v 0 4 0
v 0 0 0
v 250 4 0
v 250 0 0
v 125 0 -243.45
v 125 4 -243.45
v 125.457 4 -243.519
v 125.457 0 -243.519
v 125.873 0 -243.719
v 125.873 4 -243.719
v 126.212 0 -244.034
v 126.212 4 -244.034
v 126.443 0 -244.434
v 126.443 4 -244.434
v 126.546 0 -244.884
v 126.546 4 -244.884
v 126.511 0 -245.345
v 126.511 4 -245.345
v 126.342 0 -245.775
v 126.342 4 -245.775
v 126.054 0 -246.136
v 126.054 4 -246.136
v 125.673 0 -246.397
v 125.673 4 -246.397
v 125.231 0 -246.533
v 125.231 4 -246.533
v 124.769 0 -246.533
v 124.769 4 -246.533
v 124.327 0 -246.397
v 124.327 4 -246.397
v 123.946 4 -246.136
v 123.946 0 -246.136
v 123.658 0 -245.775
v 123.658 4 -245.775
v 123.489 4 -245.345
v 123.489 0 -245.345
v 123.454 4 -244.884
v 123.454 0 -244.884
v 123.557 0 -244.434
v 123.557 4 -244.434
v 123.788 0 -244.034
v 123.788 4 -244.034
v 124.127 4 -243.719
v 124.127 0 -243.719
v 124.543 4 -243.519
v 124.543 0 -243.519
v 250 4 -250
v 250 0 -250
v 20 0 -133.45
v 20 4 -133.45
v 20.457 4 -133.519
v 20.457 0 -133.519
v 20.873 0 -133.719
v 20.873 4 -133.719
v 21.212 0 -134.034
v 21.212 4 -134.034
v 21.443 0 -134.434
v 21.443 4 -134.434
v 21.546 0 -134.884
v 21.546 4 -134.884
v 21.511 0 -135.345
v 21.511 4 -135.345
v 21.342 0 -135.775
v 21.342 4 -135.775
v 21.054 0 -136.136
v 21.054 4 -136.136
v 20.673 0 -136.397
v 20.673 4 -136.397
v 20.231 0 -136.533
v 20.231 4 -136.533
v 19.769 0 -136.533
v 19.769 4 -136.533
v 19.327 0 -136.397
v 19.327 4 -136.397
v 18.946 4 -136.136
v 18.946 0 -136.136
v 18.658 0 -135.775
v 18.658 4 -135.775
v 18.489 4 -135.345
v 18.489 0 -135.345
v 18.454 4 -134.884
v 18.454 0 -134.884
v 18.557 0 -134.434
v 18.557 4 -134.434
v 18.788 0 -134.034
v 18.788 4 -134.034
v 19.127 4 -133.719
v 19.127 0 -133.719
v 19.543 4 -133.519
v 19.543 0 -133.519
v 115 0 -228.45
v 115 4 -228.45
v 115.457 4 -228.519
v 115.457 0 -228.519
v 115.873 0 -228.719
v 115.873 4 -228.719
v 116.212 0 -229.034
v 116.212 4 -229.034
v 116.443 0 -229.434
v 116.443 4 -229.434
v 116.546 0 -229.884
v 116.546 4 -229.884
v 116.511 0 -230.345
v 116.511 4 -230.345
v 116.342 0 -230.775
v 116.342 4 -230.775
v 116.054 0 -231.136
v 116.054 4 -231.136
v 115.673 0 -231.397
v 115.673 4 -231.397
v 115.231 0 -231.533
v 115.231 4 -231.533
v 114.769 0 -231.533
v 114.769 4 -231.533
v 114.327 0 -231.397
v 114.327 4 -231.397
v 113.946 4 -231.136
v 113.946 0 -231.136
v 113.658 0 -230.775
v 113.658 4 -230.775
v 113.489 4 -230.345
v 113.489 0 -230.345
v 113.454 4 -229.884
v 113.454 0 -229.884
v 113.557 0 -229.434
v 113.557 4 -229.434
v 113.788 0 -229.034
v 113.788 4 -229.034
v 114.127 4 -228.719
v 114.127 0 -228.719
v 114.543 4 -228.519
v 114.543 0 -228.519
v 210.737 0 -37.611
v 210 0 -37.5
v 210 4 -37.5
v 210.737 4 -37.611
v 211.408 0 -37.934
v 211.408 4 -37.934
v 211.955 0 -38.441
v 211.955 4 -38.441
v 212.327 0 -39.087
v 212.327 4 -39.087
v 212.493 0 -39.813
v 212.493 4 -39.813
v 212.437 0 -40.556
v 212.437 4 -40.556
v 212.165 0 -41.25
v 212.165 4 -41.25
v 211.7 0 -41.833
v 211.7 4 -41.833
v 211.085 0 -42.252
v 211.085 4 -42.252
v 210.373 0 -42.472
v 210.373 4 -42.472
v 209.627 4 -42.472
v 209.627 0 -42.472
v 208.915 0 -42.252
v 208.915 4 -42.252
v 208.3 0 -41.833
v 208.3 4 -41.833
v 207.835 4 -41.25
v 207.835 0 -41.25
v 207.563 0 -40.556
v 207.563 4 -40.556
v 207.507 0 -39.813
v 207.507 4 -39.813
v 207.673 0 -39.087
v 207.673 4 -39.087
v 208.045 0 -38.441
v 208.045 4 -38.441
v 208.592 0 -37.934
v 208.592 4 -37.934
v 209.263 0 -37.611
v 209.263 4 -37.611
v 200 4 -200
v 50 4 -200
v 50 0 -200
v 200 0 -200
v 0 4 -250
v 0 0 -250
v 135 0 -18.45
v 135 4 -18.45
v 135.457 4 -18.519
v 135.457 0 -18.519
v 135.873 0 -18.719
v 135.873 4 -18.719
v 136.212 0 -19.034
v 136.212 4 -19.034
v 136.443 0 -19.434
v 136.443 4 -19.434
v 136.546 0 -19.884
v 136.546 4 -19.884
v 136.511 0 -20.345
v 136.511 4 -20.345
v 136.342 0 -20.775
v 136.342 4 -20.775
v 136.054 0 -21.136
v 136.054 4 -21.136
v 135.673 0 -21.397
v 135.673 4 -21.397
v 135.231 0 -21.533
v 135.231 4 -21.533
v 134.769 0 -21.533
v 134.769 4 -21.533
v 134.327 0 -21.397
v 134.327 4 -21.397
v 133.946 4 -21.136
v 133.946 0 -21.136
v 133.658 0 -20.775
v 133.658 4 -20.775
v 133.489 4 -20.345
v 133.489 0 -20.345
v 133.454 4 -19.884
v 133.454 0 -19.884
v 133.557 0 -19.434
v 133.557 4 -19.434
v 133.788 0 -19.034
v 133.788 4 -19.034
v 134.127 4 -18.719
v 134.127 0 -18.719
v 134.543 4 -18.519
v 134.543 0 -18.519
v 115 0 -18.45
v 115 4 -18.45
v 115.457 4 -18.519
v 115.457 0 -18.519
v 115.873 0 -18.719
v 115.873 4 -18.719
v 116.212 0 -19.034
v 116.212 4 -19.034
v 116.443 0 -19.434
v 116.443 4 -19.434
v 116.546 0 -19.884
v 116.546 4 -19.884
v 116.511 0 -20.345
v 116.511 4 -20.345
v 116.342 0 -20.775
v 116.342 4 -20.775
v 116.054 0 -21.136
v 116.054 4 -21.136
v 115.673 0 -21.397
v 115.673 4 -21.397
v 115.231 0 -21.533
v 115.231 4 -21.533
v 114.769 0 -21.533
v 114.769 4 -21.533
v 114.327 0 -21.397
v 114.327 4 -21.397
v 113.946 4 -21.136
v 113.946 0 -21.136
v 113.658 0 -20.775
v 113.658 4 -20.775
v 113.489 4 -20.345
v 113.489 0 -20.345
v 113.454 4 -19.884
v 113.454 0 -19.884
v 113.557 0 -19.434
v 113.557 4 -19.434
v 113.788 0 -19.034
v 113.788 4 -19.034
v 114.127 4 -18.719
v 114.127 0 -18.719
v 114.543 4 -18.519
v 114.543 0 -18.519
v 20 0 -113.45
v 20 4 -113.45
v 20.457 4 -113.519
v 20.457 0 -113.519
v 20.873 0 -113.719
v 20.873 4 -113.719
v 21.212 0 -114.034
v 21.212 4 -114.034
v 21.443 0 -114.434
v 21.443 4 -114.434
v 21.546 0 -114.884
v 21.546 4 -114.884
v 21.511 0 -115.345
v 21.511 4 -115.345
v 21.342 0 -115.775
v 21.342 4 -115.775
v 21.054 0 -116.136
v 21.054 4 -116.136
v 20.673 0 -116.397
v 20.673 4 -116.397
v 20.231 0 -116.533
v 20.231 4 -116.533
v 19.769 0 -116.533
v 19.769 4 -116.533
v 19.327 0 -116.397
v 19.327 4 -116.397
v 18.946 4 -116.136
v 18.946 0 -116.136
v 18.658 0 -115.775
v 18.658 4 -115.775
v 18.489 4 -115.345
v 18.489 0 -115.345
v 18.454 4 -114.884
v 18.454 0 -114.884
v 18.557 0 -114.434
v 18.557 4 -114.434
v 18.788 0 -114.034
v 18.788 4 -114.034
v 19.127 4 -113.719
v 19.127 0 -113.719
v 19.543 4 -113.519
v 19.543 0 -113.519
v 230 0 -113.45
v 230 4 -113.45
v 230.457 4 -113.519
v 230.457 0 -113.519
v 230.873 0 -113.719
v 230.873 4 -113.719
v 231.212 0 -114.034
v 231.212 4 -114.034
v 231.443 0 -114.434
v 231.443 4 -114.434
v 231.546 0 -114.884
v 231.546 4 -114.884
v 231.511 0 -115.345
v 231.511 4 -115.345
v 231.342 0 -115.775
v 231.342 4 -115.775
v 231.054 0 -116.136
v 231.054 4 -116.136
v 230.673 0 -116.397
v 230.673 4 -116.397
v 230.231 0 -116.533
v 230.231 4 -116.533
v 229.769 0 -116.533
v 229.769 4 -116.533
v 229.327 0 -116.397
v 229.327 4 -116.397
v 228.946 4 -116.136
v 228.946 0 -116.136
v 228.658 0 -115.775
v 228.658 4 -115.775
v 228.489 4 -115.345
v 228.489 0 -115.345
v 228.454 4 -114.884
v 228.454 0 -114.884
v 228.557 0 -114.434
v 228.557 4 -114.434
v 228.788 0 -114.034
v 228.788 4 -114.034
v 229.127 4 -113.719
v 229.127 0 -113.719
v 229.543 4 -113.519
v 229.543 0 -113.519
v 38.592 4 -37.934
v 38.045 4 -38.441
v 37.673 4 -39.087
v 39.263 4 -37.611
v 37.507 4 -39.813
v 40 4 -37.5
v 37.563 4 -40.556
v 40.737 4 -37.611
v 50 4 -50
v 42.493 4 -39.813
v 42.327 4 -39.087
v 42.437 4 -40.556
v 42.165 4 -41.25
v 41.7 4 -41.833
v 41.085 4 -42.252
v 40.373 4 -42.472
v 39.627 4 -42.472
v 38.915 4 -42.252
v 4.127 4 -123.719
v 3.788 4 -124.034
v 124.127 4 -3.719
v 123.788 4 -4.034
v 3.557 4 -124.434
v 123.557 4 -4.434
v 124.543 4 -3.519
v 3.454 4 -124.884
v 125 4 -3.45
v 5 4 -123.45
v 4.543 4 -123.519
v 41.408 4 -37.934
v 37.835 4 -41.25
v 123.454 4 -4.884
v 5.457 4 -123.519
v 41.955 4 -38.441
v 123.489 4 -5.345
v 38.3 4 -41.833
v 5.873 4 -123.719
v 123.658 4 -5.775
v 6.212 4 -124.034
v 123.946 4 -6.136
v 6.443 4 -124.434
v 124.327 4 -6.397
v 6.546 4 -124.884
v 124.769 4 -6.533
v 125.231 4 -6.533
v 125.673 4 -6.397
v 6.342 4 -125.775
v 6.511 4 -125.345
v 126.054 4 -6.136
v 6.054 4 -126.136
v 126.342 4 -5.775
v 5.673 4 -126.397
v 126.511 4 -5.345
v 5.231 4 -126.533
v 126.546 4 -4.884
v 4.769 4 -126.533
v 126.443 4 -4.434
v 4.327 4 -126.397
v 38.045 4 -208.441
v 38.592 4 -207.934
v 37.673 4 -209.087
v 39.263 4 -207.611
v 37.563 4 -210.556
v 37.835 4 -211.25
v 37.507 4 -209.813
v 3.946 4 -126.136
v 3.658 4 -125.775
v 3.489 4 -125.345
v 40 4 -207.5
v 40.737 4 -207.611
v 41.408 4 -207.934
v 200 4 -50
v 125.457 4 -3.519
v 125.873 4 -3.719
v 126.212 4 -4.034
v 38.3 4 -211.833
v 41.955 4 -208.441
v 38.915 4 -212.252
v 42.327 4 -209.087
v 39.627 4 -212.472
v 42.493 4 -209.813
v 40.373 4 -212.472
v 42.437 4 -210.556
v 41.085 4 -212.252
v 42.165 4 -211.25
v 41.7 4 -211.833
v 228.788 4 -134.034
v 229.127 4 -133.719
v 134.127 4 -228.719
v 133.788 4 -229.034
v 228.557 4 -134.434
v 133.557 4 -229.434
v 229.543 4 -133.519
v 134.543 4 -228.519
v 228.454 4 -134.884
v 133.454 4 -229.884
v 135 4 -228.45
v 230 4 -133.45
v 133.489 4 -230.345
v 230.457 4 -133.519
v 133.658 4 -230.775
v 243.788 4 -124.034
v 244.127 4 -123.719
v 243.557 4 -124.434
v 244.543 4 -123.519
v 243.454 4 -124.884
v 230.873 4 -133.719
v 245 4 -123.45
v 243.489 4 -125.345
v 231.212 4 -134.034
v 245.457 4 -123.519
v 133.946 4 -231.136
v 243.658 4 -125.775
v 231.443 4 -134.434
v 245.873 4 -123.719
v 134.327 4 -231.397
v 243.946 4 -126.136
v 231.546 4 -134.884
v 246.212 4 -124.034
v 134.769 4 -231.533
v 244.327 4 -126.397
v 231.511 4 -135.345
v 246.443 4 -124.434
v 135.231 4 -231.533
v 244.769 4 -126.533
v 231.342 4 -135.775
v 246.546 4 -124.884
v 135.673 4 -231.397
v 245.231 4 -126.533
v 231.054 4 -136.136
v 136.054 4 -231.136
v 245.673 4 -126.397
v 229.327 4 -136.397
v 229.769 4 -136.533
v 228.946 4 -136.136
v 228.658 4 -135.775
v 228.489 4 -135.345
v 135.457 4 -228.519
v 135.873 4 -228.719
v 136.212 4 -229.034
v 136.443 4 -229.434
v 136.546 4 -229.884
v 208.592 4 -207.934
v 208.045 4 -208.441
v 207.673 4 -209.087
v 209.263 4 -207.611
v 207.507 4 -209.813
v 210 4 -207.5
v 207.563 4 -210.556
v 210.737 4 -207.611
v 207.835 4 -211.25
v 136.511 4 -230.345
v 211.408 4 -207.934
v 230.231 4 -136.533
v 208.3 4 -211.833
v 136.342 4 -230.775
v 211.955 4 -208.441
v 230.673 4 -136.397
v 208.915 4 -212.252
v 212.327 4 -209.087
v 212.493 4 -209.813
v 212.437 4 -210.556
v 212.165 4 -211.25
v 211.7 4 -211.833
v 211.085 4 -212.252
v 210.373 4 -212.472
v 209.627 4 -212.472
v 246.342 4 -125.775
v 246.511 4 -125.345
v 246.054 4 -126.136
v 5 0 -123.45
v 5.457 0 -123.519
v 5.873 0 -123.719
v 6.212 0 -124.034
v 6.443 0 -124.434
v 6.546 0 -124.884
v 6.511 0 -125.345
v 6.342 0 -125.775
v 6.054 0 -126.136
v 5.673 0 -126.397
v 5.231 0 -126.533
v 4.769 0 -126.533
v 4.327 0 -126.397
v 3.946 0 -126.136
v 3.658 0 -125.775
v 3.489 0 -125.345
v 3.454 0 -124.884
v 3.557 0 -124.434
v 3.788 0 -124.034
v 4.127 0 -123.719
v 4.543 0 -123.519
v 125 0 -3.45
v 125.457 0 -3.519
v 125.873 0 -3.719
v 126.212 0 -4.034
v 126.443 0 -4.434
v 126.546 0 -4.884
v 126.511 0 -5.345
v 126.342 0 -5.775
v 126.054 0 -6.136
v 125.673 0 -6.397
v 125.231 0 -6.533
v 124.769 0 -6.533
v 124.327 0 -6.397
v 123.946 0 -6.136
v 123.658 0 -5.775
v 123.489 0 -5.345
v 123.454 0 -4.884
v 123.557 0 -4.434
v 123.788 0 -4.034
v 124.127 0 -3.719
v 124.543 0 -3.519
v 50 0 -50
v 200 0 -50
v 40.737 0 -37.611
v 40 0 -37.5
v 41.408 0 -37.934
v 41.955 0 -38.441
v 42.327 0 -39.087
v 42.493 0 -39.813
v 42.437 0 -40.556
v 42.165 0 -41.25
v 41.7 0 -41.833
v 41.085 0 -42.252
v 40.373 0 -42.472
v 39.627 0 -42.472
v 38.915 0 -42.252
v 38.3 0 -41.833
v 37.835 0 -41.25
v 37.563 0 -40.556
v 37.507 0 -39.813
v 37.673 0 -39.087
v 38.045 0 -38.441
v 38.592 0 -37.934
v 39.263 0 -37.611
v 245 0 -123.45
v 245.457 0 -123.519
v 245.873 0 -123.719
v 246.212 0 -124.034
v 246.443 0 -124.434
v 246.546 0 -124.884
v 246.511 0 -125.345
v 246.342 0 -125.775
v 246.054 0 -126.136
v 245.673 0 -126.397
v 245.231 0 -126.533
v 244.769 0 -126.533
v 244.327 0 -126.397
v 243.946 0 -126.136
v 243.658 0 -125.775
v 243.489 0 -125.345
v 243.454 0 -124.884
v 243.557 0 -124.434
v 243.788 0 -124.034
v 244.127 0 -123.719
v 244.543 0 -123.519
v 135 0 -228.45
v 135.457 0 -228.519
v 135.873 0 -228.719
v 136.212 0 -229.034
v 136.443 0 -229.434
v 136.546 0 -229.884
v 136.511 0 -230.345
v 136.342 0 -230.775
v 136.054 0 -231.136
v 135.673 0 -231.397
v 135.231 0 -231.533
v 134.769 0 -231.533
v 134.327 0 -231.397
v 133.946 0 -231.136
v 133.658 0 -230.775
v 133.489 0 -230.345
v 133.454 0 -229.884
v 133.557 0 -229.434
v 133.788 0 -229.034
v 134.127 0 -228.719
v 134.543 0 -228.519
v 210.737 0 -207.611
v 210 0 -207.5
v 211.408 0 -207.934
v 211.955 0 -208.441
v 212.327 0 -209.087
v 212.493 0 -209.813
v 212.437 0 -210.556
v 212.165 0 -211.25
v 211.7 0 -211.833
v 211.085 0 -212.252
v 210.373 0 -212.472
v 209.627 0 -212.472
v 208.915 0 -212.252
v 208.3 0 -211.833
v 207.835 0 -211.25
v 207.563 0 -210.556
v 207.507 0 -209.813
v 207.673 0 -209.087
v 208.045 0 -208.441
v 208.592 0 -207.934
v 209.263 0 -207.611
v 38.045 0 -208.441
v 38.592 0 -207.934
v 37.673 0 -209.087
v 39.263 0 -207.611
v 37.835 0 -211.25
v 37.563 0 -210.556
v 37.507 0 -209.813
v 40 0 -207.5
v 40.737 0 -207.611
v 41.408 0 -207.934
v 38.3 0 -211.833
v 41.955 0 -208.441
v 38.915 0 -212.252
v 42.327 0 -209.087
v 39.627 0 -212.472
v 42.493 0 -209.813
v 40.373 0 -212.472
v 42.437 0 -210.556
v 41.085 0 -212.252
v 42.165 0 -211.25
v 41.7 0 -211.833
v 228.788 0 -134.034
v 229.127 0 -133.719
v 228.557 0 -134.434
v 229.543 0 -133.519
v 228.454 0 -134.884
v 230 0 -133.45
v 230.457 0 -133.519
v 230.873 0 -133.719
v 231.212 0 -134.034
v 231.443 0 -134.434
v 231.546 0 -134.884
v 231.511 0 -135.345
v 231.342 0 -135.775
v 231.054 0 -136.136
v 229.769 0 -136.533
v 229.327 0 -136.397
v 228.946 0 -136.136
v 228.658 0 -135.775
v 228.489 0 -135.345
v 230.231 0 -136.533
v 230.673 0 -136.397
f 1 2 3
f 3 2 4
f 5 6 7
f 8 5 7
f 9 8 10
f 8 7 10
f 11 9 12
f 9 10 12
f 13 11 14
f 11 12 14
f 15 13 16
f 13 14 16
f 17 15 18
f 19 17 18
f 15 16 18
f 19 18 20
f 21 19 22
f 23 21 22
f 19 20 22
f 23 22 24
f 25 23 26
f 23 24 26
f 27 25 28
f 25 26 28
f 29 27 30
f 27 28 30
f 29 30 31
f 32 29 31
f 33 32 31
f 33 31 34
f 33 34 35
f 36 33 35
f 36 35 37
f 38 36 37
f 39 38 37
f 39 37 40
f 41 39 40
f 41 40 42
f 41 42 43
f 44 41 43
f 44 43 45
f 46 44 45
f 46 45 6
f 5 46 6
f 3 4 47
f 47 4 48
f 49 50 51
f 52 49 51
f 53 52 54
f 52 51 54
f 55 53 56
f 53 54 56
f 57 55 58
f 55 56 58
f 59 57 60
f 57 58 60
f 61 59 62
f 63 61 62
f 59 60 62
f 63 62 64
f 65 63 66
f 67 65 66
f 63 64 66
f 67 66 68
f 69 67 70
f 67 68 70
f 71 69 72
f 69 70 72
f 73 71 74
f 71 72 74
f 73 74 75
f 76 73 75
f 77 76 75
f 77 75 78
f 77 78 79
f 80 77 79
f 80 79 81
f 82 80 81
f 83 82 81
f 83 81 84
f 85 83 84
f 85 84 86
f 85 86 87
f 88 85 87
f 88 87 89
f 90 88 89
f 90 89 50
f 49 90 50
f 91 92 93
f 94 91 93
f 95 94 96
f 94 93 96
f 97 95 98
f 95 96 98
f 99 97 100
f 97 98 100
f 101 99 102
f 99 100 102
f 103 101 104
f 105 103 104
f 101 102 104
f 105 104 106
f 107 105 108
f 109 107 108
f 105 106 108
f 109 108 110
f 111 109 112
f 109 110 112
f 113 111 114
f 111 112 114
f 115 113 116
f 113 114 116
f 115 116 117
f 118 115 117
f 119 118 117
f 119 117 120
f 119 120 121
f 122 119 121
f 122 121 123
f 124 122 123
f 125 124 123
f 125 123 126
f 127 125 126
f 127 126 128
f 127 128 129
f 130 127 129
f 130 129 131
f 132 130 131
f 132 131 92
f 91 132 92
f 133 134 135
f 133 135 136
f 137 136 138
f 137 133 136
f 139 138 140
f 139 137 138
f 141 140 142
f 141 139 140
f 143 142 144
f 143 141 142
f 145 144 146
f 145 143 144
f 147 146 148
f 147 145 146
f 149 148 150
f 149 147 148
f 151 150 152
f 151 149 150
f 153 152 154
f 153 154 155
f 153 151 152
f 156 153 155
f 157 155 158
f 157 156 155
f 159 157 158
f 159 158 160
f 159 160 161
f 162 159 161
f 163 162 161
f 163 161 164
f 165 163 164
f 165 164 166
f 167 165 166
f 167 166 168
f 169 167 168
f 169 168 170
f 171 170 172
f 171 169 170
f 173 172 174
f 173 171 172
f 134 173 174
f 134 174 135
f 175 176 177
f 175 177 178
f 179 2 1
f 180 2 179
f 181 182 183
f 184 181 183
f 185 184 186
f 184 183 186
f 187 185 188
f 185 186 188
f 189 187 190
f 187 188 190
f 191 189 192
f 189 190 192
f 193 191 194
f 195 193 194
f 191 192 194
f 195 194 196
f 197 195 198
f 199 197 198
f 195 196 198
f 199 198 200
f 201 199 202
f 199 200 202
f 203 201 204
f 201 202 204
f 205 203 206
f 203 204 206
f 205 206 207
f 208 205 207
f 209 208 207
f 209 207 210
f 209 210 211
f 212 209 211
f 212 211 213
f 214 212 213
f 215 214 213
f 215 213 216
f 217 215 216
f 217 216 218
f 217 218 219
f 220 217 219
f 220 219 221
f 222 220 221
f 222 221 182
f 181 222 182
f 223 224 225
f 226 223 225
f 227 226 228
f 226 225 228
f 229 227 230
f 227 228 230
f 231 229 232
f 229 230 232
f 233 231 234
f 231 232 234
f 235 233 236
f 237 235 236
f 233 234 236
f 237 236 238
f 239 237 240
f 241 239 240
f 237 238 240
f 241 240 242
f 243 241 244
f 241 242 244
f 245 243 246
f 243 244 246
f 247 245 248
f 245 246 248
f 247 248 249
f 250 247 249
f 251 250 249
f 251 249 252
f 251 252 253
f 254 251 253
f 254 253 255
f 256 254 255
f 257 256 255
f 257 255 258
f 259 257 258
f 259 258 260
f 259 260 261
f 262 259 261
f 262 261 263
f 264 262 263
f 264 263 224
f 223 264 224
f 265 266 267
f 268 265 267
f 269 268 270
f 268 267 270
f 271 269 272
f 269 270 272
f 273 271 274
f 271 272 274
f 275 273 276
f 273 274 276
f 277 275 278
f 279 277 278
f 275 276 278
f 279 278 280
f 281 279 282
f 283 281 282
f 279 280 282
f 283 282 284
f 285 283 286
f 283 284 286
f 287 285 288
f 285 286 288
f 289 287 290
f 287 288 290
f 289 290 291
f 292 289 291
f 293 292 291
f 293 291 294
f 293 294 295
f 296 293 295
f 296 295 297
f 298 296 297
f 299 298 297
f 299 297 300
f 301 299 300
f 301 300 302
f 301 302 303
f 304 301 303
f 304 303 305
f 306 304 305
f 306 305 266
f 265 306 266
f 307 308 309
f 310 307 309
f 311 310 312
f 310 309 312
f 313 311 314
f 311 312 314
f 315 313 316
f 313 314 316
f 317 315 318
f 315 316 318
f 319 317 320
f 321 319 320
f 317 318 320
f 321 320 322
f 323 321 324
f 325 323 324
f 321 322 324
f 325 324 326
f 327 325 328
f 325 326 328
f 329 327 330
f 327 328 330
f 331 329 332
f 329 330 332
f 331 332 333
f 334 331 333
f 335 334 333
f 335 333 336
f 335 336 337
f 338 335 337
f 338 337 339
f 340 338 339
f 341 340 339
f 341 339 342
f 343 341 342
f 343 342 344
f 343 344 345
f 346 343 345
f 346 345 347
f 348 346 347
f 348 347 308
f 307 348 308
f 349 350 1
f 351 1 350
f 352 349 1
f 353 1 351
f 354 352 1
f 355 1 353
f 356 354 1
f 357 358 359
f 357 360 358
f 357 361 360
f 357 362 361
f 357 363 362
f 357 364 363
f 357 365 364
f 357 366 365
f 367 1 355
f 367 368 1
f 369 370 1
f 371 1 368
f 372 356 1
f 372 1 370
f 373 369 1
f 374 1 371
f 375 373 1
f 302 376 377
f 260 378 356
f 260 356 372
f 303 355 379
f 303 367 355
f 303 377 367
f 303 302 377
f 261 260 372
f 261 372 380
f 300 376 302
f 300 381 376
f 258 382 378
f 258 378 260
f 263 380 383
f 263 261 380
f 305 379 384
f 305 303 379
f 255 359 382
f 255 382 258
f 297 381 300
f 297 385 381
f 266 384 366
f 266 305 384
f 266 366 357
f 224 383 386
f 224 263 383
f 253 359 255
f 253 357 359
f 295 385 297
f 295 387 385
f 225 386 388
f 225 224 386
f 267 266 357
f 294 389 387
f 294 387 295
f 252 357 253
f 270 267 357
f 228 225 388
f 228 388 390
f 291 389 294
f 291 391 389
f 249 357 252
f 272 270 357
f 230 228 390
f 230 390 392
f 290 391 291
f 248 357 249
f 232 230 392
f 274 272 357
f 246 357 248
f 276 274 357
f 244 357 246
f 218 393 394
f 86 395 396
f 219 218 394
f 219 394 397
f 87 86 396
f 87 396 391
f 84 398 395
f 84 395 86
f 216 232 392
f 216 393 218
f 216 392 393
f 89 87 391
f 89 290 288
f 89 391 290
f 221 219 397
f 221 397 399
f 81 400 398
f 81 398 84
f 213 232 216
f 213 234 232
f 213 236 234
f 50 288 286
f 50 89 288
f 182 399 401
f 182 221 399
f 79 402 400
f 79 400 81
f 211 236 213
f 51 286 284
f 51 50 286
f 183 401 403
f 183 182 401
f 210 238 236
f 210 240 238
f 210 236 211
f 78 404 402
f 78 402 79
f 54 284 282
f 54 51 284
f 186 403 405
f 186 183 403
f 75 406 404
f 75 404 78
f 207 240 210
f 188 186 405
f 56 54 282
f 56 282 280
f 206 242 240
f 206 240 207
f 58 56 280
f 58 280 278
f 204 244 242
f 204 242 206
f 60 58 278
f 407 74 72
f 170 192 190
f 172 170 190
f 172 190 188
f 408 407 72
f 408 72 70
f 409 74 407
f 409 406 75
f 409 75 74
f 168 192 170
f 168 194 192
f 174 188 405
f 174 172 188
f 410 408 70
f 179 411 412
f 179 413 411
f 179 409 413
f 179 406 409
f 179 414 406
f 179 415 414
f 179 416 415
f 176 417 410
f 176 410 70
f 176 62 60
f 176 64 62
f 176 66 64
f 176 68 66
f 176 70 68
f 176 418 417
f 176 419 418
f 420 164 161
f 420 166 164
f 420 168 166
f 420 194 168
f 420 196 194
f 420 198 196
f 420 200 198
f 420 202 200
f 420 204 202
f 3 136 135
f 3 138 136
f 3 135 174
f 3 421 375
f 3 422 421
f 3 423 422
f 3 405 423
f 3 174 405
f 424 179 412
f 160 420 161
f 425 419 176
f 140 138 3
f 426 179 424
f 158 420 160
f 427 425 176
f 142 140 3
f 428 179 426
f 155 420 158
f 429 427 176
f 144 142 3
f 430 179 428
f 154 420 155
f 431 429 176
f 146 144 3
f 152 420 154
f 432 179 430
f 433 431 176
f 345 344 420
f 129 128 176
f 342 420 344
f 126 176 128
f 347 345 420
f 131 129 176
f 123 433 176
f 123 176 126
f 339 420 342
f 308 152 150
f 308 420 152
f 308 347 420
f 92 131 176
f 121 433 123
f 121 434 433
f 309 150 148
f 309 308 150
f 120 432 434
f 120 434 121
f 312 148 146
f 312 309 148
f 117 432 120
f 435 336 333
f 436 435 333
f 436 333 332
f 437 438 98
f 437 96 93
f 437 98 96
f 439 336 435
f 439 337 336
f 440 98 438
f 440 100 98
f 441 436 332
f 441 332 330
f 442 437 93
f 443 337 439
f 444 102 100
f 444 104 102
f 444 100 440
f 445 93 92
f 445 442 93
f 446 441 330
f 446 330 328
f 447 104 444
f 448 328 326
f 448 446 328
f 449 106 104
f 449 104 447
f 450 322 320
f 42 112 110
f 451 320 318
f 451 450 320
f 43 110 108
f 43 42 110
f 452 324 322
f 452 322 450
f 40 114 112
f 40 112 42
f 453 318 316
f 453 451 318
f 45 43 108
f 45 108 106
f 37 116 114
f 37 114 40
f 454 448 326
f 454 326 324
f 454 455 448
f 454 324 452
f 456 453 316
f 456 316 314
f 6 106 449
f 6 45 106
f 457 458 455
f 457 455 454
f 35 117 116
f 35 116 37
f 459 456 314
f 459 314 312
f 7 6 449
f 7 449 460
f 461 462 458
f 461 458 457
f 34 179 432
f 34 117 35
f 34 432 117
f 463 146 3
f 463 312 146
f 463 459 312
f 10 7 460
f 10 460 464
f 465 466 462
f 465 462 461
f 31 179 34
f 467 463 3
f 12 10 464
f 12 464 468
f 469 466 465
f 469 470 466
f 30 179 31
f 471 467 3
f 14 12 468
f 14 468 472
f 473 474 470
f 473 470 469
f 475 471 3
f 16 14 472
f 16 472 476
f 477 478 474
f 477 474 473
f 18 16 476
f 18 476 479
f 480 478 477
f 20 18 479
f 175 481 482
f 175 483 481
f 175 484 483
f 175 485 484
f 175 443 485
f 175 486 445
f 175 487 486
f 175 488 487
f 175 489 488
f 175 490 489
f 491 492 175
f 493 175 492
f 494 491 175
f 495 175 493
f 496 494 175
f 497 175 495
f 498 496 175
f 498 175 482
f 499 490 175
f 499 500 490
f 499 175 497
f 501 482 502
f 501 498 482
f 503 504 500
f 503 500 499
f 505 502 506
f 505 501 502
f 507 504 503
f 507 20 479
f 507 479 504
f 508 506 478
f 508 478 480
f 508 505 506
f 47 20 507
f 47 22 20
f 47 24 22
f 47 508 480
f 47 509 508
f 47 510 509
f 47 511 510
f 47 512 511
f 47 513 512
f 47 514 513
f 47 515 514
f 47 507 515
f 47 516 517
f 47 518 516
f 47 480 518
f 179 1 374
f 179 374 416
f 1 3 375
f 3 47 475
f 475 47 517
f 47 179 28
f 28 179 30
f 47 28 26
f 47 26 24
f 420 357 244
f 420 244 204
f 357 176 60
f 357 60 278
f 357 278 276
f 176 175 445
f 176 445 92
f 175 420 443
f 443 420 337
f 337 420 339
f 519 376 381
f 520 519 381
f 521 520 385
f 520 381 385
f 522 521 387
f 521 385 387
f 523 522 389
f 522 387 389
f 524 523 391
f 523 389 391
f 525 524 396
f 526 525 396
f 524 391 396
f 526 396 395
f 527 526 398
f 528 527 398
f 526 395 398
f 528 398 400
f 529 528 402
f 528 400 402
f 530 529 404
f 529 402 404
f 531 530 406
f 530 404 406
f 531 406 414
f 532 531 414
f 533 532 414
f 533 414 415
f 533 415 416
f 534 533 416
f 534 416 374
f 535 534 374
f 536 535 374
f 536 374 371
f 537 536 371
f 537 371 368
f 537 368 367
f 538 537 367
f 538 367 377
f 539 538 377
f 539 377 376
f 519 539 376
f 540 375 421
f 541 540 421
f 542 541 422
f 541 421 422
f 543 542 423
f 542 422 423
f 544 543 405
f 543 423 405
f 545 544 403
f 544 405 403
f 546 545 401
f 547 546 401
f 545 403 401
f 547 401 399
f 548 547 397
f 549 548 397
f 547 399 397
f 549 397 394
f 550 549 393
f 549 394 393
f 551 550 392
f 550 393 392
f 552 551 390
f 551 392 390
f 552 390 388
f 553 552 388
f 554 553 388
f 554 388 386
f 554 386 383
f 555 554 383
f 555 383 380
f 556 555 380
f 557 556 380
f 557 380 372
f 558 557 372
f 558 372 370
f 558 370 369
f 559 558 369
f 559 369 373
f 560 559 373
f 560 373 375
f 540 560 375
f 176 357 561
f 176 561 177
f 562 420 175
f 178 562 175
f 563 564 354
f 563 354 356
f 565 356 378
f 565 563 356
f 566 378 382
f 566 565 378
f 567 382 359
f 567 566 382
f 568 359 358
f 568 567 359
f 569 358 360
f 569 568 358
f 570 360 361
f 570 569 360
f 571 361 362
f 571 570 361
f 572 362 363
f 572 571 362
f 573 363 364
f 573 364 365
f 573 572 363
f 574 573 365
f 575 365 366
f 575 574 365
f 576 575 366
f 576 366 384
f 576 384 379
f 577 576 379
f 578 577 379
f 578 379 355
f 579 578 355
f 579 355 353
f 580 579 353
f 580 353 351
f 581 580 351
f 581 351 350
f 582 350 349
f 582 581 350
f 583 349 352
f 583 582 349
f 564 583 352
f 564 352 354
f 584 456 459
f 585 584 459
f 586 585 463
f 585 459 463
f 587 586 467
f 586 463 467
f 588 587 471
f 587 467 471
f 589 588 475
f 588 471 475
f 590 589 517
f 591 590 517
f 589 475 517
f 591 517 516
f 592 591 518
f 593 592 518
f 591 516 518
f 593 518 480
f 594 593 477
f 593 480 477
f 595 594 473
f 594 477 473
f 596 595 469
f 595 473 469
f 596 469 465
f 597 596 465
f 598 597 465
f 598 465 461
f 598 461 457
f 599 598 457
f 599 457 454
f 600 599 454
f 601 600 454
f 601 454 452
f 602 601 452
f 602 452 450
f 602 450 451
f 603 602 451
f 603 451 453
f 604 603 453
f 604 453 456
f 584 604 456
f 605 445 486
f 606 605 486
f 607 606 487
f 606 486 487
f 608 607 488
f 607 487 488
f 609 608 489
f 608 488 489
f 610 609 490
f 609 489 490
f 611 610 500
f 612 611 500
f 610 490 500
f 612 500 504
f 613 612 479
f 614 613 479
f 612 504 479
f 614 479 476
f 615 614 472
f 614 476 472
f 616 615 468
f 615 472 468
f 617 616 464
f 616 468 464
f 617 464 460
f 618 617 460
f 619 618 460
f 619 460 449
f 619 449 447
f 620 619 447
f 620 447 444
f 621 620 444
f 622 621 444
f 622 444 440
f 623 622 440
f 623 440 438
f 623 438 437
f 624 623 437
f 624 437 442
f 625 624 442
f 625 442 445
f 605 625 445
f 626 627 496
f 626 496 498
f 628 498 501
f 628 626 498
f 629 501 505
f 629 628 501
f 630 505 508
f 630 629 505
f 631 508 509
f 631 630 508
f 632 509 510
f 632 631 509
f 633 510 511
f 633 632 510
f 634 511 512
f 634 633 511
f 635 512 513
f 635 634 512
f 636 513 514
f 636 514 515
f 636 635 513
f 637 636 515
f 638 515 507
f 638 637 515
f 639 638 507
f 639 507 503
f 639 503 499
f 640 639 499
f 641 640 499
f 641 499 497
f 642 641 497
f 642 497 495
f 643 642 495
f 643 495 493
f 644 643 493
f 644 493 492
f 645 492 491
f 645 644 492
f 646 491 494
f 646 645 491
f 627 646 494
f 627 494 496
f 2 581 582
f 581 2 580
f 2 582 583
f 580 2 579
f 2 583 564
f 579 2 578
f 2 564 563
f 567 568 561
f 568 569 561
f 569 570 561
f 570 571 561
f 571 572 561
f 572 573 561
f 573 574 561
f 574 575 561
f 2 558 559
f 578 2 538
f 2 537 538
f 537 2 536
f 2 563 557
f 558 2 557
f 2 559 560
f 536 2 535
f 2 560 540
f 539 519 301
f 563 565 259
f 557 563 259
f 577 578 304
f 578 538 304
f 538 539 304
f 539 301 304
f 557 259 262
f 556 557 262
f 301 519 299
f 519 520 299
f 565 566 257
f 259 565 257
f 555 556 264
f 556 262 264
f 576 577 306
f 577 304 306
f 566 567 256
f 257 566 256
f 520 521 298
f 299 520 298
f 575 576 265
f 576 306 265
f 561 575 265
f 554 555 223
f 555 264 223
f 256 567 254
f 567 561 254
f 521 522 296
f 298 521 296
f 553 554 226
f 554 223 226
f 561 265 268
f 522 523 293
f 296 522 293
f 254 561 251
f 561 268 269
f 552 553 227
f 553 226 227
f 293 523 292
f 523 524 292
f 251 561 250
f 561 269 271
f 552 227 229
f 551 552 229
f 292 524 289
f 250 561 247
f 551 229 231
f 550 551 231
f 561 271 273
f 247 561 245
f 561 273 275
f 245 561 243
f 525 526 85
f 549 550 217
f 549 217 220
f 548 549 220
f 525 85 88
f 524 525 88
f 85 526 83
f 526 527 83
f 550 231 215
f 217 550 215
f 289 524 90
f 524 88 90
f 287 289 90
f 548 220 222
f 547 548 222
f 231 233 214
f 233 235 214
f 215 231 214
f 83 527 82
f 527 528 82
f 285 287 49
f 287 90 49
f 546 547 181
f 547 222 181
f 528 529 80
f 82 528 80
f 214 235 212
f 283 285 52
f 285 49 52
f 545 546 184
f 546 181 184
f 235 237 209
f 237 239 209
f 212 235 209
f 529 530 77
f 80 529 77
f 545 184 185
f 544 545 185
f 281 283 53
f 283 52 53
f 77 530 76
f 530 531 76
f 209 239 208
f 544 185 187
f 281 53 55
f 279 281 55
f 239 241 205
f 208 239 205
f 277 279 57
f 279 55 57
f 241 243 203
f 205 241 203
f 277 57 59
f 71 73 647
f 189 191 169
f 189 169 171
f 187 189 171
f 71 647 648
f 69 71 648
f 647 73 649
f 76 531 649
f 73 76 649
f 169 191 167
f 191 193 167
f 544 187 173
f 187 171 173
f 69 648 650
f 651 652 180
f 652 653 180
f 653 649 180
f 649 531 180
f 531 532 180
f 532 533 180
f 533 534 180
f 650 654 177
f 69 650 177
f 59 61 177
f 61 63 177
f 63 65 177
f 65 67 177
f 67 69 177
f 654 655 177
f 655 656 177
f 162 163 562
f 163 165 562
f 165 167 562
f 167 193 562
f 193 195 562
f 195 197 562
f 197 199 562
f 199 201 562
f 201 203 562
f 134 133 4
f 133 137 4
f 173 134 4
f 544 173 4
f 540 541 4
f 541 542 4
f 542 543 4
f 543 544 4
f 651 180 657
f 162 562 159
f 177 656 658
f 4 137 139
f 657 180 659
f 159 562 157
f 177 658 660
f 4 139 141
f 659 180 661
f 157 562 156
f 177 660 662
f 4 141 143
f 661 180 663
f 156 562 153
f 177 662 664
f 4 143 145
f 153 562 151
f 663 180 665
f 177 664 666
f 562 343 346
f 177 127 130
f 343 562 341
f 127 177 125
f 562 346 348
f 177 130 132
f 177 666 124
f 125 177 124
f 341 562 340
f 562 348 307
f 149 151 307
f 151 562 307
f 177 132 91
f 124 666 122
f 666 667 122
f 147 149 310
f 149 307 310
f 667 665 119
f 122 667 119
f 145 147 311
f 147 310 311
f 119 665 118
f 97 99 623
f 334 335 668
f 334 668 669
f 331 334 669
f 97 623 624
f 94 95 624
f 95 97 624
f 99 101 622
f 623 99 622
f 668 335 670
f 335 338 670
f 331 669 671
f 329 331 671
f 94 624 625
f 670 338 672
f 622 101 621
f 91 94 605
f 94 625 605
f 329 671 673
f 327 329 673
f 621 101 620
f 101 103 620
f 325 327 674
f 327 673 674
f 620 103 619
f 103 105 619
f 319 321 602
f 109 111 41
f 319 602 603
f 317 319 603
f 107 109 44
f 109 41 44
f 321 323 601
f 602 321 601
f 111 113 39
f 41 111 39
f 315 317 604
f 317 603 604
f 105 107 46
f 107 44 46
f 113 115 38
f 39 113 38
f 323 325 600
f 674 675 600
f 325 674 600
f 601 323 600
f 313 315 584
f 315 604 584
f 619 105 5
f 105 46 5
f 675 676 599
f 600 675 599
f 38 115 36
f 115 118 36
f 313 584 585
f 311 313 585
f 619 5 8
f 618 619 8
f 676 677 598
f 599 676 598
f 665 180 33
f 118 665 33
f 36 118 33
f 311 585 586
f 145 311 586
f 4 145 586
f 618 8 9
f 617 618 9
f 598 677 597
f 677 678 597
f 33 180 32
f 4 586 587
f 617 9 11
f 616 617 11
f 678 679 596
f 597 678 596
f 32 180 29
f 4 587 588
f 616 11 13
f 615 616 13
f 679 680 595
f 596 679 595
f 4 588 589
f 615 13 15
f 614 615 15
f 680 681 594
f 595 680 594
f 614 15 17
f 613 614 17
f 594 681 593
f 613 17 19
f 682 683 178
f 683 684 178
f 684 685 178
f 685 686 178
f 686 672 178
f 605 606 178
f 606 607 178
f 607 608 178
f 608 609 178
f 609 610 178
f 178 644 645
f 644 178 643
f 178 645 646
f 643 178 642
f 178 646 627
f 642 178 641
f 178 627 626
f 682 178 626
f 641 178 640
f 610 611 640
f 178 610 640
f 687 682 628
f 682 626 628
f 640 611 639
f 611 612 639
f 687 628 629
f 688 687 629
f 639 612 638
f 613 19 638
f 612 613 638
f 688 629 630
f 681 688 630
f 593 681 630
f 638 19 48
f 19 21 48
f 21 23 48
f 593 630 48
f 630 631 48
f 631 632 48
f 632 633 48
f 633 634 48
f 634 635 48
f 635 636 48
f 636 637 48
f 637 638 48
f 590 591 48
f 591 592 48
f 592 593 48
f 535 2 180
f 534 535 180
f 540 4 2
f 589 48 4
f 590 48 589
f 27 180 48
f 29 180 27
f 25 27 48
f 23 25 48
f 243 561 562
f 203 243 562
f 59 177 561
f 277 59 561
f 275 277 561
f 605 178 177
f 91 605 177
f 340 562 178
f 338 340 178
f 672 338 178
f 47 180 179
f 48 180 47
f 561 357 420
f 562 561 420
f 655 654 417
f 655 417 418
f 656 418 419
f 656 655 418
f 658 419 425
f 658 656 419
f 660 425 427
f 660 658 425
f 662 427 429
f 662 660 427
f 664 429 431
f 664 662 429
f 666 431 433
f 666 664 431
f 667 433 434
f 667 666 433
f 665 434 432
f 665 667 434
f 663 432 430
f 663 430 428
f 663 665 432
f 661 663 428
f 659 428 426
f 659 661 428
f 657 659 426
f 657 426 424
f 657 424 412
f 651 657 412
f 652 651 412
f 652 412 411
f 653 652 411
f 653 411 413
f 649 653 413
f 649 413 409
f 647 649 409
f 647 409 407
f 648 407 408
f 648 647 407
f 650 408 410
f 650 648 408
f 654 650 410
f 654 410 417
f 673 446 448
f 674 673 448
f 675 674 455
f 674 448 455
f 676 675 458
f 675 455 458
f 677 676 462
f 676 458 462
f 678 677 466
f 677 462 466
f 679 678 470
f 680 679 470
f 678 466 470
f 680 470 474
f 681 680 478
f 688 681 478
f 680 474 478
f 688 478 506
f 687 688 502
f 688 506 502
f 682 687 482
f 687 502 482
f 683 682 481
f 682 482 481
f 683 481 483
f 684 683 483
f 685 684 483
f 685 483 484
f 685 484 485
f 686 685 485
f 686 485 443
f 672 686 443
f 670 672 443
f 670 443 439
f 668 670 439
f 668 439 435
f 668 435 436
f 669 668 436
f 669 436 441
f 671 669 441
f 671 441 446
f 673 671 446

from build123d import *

# Parameters (mm, degrees)
CROQUIS1_W              = 250
CROQUIS1_H              = 250
CROQUIS1_R              = 2.5
SALIENTE_EXTRUIR1_DEPTH = 4
CORTAR_EXTRUIR1_DEPTH   = 4
CROQUIS3_W              = 150
CROQUIS3_H              = 150
CROQUIS3_W_2            = 100
CROQUIS3_H_2            = 100
SALIENTE_EXTRUIR2_DEPTH = 4
CROQUIS4_R              = 1.55
CORTAR_EXTRUIR2_DEPTH   = 10
CROQUIS5_W              = 150
CROQUIS5_H              = 150
CROQUIS5_W_2            = 100
CROQUIS5_H_2            = 100
CORTAR_EXTRUIR3_DEPTH   = 10
CROQUIS6_R              = 1.55
CORTAR_EXTRUIR4_DEPTH   = 10


with BuildPart() as part:
    # Croquis1 → Saliente-Extruir1 (new body)
    with BuildSketch(Plane(origin=(0, 0, 0), x_dir=(1, 0, 0), z_dir=(0, 1, 0))):
        with Locations((125, 125)):
            Rectangle(CROQUIS1_W, CROQUIS1_H)
        with Locations(Location((40, 210, 0), (0, 0, 270))):
            Circle(CROQUIS1_R, mode=Mode.SUBTRACT)
        with Locations(Location((210, 210, 0), (0, 0, 270))):
            Circle(CROQUIS1_R, mode=Mode.SUBTRACT)
        with Locations(Location((210, 40, 0), (0, 0, 270))):
            Circle(CROQUIS1_R, mode=Mode.SUBTRACT)
        with Locations(Location((40, 40, 0), (0, 0, 270))):
            Circle(CROQUIS1_R, mode=Mode.SUBTRACT)
    extrude(amount=SALIENTE_EXTRUIR1_DEPTH)

    # Croquis2 → Cortar-Extruir1 (cut)
    with BuildSketch(Plane(origin=(0, 4, 0), x_dir=(1, 0, 0), z_dir=(0, 1, 0))):
        Polygon((50, 50), (200, 50), (200, 200), (50, 200), (50, 150.09044268), align=None)
    extrude(amount=-CORTAR_EXTRUIR1_DEPTH, mode=Mode.SUBTRACT)

    # Croquis3 → Saliente-Extruir2 (add)
    with BuildSketch(Plane(origin=(0, 4, 0), x_dir=(1, 0, 0), z_dir=(0, 1, 0))):
        with Locations((125, 125)):
            Rectangle(CROQUIS3_W, CROQUIS3_H)
        with Locations((125, 125)):
            Rectangle(CROQUIS3_W_2, CROQUIS3_H_2, mode=Mode.SUBTRACT)
    extrude(amount=-SALIENTE_EXTRUIR2_DEPTH)

    # Croquis4 → Cortar-Extruir2 (cut)
    with BuildSketch(Plane(origin=(0, 4, 0), x_dir=(1, 0, 0), z_dir=(0, 1, 0))):
        with Locations(Location((115, 20, 0), (0, 0, 270))):
            Circle(CROQUIS4_R)
        with Locations(Location((135, 20, 0), (0, 0, 270))):
            Circle(CROQUIS4_R)
        with Locations(Location((125, 5, 0), (0, 0, 270))):
            Circle(CROQUIS4_R)
    extrude(amount=-CORTAR_EXTRUIR2_DEPTH, mode=Mode.SUBTRACT)

    # Croquis5 → Cortar-Extruir3 (cut)
    with BuildSketch(Plane(origin=(0, 4, 0), x_dir=(1, 0, 0), z_dir=(0, 1, 0))):
        with Locations((125, 125)):
            Rectangle(CROQUIS5_W, CROQUIS5_H)
        with Locations((125, 125)):
            Rectangle(CROQUIS5_W_2, CROQUIS5_H_2, mode=Mode.SUBTRACT)
    extrude(amount=-CORTAR_EXTRUIR3_DEPTH, mode=Mode.SUBTRACT)

    # Croquis6 → Cortar-Extruir4 (cut)
    with BuildSketch(Plane(origin=(0, 4, 0), x_dir=(1, 0, 0), z_dir=(0, 1, 0))):
        with Locations(Location((125, 5, 0), (0, 0, 270))):
            Circle(CROQUIS6_R)
        with Locations(Location((115, 20, 0), (0, 0, 270))):
            Circle(CROQUIS6_R)
        with Locations(Location((135, 20, 0), (0, 0, 270))):
            Circle(CROQUIS6_R)
        with Locations(Location((20, 115, 0), (0, 0, 270))):
            Circle(CROQUIS6_R)
        with Locations(Location((20, 135, 0), (0, 0, 270))):
            Circle(CROQUIS6_R)
        with Locations(Location((5, 125, 0), (0, 0, 270))):
            Circle(CROQUIS6_R)
        with Locations(Location((115, 230, 0), (0, 0, 270))):
            Circle(CROQUIS6_R)
        with Locations(Location((135, 230, 0), (0, 0, 270))):
            Circle(CROQUIS6_R)
        with Locations(Location((125, 245, 0), (0, 0, 270))):
            Circle(CROQUIS6_R)
        with Locations(Location((230, 135, 0), (0, 0, 270))):
            Circle(CROQUIS6_R)
        with Locations(Location((230, 115, 0), (0, 0, 270))):
            Circle(CROQUIS6_R)
        with Locations(Location((245, 125, 0), (0, 0, 270))):
            Circle(CROQUIS6_R)
    extrude(amount=-CORTAR_EXTRUIR4_DEPTH, mode=Mode.SUBTRACT)


solid = part.part
